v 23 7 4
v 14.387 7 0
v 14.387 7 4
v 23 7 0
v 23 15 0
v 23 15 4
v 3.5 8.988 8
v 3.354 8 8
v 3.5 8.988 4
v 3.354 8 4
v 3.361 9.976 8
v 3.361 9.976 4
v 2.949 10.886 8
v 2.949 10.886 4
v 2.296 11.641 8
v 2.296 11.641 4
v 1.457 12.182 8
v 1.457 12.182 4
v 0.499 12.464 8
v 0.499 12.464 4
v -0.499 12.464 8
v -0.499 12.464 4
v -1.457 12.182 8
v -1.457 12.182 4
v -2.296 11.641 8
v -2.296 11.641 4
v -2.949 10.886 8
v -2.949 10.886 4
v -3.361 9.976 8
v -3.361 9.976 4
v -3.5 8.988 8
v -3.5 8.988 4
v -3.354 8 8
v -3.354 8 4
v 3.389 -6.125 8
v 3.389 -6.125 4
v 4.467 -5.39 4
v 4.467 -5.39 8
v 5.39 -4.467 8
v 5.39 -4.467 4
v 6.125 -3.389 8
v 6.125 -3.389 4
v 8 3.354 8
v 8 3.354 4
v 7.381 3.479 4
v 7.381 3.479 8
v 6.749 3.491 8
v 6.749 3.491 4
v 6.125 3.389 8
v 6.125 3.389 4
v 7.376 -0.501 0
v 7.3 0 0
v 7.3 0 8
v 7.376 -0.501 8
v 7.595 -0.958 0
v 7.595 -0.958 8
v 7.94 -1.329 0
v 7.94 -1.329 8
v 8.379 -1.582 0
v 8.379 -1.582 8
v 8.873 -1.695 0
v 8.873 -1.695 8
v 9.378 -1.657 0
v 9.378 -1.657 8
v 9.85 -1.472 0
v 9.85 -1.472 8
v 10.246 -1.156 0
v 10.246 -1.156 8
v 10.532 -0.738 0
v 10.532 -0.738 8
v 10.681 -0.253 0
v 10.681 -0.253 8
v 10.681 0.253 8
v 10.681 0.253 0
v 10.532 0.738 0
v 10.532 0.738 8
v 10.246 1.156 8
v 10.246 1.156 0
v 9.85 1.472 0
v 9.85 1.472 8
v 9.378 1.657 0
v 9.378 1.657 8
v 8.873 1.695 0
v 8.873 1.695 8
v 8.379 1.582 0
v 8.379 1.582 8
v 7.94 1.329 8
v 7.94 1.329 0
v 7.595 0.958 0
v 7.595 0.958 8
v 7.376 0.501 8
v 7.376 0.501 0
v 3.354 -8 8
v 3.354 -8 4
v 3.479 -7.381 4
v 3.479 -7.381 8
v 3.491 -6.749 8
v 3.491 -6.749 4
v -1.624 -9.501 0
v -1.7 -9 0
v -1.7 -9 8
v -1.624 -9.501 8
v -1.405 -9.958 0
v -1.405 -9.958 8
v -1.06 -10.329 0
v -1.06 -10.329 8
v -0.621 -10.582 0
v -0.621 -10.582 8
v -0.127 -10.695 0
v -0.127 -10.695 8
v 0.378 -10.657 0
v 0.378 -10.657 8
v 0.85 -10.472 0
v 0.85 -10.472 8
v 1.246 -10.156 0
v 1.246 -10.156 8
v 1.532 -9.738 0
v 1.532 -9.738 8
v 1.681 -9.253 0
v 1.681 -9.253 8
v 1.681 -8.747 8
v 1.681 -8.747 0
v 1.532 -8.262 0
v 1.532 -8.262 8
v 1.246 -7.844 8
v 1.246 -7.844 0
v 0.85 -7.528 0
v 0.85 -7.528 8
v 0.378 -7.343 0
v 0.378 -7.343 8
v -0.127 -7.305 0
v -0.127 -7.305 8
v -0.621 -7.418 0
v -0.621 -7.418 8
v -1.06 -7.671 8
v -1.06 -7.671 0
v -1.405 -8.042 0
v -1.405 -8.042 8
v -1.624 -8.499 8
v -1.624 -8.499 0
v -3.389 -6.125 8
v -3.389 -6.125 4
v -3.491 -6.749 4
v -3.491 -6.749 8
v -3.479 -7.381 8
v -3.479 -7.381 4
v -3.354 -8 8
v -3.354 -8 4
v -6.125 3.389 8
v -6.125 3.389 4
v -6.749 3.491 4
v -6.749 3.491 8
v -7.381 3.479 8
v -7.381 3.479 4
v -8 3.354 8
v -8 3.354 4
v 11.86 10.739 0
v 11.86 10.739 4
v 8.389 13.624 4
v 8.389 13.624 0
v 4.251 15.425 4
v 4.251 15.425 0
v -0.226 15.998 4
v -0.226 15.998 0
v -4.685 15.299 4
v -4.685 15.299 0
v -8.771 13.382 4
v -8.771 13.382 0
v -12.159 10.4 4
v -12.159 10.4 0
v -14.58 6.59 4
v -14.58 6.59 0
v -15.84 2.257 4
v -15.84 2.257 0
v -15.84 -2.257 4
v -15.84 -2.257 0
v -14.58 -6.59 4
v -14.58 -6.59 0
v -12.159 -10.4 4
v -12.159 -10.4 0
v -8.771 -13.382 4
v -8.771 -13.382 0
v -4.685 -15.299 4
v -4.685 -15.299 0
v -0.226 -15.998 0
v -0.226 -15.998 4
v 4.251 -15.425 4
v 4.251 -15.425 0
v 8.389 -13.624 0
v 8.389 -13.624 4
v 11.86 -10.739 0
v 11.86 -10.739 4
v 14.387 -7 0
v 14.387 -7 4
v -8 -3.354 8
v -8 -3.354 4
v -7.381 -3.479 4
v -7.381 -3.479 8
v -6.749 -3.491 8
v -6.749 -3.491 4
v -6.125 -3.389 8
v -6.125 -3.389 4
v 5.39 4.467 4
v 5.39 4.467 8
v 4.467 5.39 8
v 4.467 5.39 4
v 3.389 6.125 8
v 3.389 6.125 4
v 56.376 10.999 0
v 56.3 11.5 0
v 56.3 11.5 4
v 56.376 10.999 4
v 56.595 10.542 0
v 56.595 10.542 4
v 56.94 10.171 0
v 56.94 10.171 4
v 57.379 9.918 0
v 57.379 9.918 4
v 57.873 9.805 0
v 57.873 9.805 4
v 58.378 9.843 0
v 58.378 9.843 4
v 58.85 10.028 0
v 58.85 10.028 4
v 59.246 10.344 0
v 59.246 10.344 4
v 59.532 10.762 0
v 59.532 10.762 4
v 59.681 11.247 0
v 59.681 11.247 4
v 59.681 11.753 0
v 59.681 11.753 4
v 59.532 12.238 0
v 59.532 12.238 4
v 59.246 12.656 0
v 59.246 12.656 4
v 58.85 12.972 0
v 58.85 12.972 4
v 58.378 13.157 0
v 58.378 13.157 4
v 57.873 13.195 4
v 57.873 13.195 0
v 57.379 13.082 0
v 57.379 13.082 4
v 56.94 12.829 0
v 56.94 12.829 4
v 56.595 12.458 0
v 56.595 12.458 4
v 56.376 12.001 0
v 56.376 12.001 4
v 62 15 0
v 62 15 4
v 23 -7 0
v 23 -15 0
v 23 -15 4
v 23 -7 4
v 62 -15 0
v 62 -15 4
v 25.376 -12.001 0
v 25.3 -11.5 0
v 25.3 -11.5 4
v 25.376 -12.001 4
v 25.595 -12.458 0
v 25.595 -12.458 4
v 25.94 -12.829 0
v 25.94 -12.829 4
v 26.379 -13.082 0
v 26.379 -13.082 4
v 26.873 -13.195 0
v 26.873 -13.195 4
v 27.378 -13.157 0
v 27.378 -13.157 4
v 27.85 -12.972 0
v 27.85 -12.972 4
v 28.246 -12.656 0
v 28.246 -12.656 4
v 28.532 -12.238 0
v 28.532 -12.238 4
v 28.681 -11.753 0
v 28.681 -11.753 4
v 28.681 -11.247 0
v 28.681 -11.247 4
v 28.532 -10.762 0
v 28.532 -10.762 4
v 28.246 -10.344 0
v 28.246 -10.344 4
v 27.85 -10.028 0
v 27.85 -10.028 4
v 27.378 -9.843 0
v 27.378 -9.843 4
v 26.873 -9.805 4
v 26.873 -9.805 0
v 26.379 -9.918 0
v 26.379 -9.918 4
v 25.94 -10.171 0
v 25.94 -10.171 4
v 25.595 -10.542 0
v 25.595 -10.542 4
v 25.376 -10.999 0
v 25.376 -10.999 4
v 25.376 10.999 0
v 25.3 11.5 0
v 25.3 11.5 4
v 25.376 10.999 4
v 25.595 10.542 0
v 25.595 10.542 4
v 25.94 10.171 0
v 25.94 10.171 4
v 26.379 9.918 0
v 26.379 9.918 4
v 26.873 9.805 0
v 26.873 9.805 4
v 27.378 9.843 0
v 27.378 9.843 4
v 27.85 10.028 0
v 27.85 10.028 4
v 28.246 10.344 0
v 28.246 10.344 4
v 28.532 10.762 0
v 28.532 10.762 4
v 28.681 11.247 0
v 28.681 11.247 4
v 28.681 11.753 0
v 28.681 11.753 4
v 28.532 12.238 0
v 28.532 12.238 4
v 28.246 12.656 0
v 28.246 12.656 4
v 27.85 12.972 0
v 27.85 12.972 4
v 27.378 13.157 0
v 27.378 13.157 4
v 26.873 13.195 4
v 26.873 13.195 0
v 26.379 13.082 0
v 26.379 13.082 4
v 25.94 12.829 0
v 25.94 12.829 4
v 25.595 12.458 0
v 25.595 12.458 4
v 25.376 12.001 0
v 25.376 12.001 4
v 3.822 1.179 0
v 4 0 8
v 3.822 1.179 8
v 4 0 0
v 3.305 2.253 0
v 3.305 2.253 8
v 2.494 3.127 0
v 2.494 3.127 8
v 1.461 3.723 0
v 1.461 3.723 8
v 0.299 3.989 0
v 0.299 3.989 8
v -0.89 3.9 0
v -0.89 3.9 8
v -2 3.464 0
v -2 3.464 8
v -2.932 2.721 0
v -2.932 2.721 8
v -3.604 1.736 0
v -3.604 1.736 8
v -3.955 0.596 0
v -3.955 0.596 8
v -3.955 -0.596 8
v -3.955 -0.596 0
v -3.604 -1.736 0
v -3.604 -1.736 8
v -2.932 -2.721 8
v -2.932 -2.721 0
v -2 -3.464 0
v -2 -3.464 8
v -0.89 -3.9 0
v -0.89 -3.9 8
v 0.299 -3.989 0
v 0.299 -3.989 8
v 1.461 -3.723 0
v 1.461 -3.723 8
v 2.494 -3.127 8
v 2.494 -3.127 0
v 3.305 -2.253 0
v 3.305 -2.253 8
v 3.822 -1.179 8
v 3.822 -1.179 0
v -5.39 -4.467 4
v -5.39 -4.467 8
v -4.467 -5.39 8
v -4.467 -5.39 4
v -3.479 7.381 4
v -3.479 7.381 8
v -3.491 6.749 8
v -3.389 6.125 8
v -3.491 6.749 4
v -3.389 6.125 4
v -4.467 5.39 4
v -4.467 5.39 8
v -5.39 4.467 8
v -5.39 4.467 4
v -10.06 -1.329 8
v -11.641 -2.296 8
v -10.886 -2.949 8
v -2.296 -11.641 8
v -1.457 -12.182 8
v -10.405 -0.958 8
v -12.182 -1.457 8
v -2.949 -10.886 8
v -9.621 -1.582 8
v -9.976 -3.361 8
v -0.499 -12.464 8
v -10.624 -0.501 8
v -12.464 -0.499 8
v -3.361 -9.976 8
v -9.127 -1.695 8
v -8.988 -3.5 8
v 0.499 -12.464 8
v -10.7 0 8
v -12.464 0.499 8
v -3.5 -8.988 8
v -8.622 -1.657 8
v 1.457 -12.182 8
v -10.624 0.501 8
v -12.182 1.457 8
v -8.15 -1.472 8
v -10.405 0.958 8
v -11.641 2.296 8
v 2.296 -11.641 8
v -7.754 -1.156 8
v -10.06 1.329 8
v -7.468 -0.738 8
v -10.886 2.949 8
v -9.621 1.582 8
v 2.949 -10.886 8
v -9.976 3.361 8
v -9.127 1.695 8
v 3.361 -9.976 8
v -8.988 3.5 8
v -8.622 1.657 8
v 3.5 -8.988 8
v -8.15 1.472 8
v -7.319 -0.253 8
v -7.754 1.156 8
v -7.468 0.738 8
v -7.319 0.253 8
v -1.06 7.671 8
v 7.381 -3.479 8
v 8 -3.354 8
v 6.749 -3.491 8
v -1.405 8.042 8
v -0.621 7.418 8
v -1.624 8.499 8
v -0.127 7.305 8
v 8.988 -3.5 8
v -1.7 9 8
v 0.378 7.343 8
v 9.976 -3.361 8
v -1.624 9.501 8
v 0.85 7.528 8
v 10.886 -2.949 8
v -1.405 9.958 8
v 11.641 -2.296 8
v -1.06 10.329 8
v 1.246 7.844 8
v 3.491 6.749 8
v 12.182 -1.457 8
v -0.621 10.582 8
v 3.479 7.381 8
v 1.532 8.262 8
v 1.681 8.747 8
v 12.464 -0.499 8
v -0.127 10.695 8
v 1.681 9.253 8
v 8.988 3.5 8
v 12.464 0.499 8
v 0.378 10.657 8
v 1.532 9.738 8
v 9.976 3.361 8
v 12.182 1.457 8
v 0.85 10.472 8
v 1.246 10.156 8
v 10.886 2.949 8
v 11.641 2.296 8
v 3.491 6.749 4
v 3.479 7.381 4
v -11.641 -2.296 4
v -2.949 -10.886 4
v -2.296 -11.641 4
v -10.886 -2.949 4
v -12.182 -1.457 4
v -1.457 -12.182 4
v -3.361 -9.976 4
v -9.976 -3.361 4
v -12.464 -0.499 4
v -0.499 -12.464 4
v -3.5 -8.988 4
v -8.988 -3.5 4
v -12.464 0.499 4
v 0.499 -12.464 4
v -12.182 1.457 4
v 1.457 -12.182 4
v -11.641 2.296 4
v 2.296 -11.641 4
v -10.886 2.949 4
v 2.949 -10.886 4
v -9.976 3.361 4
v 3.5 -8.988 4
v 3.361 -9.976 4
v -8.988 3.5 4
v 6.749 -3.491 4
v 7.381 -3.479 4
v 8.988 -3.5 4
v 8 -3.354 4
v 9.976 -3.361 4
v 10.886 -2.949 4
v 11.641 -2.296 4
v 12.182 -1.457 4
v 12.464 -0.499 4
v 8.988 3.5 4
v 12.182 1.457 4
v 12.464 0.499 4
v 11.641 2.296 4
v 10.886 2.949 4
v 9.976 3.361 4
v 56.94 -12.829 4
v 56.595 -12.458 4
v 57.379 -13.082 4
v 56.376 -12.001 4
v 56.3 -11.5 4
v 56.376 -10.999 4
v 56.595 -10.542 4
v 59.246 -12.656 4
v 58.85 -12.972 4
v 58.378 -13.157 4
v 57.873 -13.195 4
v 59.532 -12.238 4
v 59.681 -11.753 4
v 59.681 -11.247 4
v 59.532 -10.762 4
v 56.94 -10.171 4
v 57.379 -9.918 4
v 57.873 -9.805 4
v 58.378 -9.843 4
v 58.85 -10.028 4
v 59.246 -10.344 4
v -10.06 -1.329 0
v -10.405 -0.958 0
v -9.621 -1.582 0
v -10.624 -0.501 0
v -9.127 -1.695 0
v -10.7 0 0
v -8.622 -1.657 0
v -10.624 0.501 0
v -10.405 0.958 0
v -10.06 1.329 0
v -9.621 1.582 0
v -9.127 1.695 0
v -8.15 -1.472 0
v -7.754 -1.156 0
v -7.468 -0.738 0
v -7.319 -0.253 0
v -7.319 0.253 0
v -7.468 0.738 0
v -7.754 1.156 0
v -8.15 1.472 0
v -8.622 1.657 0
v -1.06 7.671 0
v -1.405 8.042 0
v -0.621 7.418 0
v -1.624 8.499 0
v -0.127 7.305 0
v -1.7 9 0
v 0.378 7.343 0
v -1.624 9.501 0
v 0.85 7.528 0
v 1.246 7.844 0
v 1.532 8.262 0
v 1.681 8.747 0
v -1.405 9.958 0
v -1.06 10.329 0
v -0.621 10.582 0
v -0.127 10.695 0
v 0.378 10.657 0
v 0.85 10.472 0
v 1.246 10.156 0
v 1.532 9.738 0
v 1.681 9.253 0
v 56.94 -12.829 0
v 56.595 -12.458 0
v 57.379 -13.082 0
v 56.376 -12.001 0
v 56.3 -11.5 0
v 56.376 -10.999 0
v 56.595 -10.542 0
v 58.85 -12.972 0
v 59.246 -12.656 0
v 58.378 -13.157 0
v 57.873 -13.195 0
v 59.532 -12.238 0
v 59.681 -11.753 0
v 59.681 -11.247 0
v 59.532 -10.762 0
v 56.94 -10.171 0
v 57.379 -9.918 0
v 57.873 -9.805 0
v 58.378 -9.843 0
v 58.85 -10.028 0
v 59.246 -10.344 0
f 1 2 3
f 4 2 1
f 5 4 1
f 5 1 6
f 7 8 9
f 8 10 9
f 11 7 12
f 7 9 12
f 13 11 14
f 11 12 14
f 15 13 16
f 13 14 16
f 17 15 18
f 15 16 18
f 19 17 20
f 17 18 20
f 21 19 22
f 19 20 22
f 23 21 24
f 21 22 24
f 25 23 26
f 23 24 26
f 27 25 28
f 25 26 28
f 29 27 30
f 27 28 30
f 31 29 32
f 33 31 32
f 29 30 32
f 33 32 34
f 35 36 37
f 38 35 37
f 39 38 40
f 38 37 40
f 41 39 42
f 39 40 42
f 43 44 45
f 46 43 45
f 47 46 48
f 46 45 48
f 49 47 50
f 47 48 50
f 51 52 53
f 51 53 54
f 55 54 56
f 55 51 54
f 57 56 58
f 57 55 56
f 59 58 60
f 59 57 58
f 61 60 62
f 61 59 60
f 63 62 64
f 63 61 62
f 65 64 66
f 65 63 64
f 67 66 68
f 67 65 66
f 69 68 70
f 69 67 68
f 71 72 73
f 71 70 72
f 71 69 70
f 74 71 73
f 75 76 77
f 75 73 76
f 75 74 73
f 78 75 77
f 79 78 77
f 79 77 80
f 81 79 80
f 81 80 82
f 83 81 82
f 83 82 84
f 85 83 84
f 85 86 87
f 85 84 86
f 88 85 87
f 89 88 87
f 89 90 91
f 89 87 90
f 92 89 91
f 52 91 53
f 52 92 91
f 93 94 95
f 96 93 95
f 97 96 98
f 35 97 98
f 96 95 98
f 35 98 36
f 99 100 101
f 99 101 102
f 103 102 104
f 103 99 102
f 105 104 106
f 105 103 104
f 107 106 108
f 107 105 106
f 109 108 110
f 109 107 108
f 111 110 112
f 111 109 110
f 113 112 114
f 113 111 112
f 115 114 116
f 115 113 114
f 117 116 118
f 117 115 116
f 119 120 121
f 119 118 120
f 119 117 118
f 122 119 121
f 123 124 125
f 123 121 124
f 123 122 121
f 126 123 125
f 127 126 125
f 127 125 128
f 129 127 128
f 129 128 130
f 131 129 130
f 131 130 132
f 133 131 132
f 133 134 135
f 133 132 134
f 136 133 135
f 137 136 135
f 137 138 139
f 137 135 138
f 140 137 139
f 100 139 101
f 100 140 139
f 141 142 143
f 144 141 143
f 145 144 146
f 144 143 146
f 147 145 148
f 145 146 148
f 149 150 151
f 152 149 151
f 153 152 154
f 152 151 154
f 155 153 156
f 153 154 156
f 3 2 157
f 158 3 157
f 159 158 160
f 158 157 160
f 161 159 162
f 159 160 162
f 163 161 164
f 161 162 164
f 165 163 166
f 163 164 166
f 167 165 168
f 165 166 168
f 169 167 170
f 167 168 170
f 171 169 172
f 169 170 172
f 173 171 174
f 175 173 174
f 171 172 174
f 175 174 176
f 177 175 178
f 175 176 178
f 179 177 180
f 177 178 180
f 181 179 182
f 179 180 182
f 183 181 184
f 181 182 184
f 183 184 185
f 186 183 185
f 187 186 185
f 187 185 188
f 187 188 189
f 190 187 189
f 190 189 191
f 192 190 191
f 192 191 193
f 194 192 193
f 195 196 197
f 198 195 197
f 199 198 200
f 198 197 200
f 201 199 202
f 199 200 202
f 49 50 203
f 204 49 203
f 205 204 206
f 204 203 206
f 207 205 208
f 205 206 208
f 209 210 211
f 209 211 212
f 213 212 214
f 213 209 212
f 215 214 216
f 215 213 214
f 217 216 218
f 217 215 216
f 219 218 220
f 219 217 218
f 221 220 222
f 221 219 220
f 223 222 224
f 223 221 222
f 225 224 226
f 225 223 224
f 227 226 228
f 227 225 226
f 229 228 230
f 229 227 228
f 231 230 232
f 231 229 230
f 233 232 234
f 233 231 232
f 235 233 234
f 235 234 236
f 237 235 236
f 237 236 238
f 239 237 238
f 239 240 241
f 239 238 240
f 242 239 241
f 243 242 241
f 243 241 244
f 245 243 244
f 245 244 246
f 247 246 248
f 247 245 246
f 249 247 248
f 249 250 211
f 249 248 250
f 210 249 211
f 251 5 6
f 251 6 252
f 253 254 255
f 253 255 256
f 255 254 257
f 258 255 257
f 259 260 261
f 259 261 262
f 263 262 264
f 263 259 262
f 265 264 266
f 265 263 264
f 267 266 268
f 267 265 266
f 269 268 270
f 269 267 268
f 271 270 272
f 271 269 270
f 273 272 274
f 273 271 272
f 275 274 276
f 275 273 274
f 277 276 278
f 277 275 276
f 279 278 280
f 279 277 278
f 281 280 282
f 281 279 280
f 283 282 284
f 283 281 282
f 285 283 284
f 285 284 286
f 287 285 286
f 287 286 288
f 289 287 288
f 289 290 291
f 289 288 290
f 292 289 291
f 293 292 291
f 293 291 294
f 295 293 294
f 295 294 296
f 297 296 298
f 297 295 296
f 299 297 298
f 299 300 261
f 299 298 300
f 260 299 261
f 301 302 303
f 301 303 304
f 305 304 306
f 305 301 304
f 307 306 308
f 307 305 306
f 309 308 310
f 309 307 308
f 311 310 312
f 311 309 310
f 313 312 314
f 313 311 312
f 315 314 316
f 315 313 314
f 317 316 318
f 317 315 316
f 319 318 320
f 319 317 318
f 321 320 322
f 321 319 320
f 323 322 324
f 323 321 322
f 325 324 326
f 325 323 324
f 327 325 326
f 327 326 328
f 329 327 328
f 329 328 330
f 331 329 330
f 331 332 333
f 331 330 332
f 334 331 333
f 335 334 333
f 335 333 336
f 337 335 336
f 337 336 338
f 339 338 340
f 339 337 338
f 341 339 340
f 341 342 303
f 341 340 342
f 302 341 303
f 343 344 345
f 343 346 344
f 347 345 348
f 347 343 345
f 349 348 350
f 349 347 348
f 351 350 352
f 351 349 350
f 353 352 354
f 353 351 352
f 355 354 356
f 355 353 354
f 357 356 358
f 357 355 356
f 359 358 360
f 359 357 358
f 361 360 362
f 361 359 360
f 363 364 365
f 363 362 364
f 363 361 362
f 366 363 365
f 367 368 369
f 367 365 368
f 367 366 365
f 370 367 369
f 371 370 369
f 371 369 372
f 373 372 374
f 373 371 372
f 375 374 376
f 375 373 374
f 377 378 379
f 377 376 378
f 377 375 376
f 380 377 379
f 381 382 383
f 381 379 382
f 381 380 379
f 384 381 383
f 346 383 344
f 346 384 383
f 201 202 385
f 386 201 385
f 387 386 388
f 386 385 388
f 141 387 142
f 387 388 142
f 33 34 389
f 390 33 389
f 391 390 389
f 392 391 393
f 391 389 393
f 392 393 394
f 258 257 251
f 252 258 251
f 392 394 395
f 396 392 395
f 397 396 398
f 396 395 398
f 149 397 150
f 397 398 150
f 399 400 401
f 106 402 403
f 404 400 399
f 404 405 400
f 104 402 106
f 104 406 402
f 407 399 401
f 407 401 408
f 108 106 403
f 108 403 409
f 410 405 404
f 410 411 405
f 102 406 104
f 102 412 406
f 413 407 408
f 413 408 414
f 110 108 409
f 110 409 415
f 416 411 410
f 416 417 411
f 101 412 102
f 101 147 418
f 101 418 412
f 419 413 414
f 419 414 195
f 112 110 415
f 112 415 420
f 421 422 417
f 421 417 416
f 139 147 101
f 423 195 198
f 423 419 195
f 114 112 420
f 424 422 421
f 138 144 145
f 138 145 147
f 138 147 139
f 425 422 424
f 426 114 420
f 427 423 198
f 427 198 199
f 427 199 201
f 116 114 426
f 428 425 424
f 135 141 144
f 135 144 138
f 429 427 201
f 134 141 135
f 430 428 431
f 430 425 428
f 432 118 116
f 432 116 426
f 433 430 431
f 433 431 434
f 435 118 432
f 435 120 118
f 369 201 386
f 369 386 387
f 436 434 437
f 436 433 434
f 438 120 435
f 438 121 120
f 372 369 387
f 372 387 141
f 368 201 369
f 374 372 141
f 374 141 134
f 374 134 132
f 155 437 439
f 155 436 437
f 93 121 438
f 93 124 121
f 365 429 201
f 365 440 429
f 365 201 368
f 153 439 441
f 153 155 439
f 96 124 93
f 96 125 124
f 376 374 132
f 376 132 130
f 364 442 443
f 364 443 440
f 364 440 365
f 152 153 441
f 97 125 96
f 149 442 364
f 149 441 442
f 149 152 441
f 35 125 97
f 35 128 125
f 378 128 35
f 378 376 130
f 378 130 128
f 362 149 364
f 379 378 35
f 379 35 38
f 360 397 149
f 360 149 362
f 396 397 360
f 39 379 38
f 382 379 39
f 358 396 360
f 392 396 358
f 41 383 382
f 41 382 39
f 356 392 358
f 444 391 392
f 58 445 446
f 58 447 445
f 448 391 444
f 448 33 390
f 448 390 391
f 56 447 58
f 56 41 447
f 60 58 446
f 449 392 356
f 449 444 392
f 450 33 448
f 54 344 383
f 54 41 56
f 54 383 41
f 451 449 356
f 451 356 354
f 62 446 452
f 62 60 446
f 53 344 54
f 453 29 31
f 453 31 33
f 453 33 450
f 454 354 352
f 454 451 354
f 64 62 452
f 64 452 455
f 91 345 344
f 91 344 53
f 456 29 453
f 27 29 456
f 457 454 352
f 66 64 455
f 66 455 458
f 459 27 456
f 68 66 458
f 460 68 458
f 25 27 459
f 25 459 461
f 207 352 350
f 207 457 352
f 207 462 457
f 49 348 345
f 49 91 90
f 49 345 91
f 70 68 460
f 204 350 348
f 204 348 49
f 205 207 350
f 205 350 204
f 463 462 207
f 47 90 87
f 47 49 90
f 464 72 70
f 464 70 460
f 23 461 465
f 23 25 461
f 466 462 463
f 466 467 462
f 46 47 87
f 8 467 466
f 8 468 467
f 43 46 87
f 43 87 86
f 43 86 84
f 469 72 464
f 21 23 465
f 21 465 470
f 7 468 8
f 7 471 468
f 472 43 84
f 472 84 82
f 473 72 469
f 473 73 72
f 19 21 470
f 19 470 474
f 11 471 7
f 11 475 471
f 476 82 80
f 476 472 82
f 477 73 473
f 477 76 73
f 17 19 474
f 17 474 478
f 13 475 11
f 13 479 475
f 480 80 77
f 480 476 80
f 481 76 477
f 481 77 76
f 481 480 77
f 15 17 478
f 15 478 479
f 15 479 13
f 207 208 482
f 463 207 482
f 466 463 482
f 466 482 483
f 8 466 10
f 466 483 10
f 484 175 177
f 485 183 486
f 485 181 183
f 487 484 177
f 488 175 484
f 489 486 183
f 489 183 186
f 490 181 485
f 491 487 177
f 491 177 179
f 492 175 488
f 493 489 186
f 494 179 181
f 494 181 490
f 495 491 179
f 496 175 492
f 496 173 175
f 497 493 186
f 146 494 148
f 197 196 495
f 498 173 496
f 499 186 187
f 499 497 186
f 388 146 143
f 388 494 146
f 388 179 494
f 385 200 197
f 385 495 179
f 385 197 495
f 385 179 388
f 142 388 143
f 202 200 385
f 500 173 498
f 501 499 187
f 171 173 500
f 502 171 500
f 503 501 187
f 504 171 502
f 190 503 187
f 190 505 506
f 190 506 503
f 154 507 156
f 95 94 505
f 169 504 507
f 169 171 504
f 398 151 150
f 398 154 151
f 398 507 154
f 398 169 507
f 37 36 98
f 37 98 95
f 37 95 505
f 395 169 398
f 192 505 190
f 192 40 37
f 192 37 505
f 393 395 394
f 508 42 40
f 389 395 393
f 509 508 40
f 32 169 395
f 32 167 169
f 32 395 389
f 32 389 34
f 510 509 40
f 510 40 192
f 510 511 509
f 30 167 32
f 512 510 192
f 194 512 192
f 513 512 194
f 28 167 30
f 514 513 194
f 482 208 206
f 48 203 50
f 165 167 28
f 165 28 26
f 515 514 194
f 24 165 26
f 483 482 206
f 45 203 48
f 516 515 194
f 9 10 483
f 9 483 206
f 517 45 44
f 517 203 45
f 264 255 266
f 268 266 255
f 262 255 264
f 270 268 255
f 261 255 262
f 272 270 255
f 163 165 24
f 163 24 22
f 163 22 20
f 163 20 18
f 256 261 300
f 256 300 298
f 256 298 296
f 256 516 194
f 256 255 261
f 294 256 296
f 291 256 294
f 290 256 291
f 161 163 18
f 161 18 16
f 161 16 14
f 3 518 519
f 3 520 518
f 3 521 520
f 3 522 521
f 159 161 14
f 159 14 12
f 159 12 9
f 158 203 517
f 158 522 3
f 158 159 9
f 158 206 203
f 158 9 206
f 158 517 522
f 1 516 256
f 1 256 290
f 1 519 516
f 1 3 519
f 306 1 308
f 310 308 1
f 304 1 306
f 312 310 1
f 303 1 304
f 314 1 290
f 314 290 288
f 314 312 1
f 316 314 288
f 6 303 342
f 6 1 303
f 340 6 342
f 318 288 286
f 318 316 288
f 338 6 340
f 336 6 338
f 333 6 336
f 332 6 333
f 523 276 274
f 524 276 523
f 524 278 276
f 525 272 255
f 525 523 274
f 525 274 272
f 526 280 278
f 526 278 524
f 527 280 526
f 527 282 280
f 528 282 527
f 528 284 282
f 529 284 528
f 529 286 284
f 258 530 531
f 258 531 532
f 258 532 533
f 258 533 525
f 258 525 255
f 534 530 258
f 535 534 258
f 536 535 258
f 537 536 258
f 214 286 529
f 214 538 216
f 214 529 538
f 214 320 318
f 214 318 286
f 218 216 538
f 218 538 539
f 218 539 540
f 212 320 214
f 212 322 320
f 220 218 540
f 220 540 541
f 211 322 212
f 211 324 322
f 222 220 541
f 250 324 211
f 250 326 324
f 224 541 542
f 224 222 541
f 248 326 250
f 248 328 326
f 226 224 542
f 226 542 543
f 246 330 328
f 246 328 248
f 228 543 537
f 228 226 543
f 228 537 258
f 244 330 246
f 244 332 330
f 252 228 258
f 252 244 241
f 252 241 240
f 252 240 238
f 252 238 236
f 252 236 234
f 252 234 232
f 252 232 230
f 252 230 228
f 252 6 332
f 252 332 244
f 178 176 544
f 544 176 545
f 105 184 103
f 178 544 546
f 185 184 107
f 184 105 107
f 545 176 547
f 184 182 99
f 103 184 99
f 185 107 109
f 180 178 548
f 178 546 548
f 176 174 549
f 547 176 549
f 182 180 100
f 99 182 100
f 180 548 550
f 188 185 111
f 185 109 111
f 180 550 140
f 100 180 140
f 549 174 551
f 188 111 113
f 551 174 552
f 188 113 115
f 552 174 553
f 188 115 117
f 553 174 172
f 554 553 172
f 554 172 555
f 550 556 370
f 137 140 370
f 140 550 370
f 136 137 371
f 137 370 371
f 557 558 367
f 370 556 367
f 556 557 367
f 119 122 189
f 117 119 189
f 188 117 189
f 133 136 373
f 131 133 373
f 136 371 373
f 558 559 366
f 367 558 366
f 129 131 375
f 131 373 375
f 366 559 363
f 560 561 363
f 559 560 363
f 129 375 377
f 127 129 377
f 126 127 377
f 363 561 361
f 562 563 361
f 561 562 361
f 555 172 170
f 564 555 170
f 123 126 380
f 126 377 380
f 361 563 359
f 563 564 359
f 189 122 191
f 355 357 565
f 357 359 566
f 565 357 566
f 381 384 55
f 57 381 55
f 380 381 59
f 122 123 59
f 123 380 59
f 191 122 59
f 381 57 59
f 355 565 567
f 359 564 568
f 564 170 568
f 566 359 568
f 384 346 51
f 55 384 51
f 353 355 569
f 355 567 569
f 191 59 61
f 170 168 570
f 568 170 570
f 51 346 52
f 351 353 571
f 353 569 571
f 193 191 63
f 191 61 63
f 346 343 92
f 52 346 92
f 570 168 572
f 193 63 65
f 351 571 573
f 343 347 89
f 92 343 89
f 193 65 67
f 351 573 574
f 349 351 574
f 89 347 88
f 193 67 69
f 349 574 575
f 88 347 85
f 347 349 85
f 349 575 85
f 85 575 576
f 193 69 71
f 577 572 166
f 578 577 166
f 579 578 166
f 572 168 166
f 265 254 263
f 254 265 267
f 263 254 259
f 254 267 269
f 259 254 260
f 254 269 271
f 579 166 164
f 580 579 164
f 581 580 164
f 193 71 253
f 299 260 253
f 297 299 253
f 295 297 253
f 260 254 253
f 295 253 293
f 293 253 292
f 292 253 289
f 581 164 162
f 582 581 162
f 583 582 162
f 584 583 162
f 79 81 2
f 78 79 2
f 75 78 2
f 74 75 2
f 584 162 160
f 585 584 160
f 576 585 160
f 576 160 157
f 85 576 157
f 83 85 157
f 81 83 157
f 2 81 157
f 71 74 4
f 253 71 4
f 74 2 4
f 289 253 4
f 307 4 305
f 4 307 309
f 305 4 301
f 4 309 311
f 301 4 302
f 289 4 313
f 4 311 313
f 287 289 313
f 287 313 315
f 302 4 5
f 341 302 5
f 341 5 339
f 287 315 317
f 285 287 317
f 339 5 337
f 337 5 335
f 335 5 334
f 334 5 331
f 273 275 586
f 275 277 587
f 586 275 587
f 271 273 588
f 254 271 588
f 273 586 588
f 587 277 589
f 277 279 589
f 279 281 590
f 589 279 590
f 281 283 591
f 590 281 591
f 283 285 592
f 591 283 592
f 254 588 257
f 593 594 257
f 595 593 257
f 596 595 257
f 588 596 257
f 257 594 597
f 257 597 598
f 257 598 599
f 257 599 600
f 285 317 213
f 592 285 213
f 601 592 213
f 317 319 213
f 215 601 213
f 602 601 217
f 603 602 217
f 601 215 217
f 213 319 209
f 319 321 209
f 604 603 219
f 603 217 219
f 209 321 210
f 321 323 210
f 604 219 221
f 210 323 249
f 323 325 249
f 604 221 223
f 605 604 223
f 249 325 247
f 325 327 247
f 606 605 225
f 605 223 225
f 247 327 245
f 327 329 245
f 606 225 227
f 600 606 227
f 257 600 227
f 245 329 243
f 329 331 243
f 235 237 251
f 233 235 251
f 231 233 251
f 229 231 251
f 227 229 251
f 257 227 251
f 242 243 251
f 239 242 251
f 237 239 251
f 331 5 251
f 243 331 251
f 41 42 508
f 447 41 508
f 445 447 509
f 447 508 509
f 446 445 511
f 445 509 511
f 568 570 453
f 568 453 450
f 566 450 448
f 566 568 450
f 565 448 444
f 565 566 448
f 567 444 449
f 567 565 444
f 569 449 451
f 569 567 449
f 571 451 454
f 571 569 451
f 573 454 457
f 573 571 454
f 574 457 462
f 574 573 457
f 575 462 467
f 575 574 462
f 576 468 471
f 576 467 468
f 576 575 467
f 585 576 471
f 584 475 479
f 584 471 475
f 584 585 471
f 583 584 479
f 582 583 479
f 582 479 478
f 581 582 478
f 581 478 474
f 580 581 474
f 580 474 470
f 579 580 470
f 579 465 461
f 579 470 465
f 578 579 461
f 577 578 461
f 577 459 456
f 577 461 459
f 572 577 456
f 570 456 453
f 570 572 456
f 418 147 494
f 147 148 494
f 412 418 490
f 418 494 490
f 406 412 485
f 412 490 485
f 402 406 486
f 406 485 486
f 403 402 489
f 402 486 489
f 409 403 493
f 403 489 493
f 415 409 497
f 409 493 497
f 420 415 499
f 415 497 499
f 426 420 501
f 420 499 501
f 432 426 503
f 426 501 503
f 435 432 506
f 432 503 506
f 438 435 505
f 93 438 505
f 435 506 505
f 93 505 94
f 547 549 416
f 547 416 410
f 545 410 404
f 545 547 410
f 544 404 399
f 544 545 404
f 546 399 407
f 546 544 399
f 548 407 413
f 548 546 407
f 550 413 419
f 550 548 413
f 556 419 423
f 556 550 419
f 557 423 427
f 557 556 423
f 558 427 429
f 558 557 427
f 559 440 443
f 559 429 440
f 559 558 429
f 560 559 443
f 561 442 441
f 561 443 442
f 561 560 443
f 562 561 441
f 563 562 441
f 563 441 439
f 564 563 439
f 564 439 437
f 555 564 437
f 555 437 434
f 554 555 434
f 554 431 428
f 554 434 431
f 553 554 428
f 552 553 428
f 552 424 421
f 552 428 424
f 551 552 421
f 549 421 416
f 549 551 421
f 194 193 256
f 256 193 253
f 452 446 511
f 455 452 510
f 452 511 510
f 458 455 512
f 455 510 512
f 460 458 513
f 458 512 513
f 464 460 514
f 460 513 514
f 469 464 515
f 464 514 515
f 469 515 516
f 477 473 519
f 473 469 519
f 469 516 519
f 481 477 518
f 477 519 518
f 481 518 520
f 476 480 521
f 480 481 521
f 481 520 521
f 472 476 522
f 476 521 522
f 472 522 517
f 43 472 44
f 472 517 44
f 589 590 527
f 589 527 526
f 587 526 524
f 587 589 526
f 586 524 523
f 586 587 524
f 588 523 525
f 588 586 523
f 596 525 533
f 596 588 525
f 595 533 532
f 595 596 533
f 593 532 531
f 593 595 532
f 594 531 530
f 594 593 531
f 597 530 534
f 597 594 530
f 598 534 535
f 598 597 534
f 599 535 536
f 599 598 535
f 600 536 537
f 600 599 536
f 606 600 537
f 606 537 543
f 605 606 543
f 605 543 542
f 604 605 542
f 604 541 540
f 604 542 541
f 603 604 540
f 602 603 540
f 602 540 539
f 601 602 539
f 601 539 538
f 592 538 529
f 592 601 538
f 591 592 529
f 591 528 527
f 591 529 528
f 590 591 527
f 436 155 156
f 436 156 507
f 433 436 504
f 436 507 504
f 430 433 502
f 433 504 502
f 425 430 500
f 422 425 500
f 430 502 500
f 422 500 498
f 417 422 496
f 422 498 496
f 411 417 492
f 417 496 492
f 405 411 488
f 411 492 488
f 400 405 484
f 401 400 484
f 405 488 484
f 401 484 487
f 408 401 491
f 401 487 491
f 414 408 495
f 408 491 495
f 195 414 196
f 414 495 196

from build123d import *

# Parameters (mm, degrees)
METAL_HORN_FLANGE_PROFILE_R              = 16
METAL_HORN_FLANGE_DEPTH                  = 4
STRAIGHT_FOREARM_WEB_PROFILE_W           = 28
STRAIGHT_FOREARM_WEB_PROFILE_H           = 14
STRAIGHT_FOREARM_WEB_DEPTH               = 4
REPLACEABLE_TOOL_MOUNTING_DECK_PROFILE_W = 39
REPLACEABLE_TOOL_MOUNTING_DECK_PROFILE_H = 30
REPLACEABLE_TOOL_MOUNTING_DECK_DEPTH     = 4
DOWEL_SUPPORT_HUB_START                  = 4
DOWEL_SUPPORT_HUB_PROFILE_R              = 7
DOWEL_SUPPORT_HUB_PROFILE_R_2            = 4
DOWEL_SUPPORT_HUB_DEPTH                  = 4
WASHER_SEATS_CLEAR_DOWEL_SLEEVE_START    = 4
RAISED_WASHER_SEATS_PCD14_R              = 3.5
WASHER_SEATS_CLEAR_DOWEL_SLEEVE_DEPTH    = 4
ELBOW_SLEEVE_BORE_START                  = -50
ELBOW_SLEEVE_BORE_PROFILE_R              = 4
ELBOW_SLEEVE_BORE_DEPTH                  = 115.52906322
MODULAR_TOOL_FOUR_M3_PATTERN_START       = -50
MODULAR_TOOL_FOUR_M3_PATTERN_PROFILE_R   = 1.7
MODULAR_TOOL_FOUR_M3_PATTERN_DEPTH       = 115.52906322
PRINTED_HUB_M3_WASHER_SEATS_PCD18_START  = 4
PRINTED_HUB_WASHER_SEATS_PCD18_PROFILE_R = 3.5
PRINTED_HUB_M3_WASHER_SEATS_PCD18_DEPTH  = 4
PRINTED_HUB_M3_CLEARANCE_PCD18_START     = -50
PRINTED_HUB_M3_CLEARANCE_PCD18_PROFILE_R = 1.7
PRINTED_HUB_M3_CLEARANCE_PCD18_DEPTH     = 115.52906322


with BuildPart() as part:
    # Metal_horn_flange_profile → Metal_horn_flange (new body)
    with BuildSketch(Plane.XY):
        Circle(METAL_HORN_FLANGE_PROFILE_R)
    extrude(amount=METAL_HORN_FLANGE_DEPTH)

    # Straight_forearm_web_profile → Straight_forearm_web (add)
    with BuildSketch(Plane.XY):
        with Locations((14, 0)):
            Rectangle(STRAIGHT_FOREARM_WEB_PROFILE_W, STRAIGHT_FOREARM_WEB_PROFILE_H)
    extrude(amount=STRAIGHT_FOREARM_WEB_DEPTH)

    # Replaceable_tool_mounting_deck_profile → Replaceable_tool_mounting_deck (add)
    with BuildSketch(Plane.XY):
        with Locations((42.5, 0)):
            Rectangle(REPLACEABLE_TOOL_MOUNTING_DECK_PROFILE_W, REPLACEABLE_TOOL_MOUNTING_DECK_PROFILE_H)
    extrude(amount=REPLACEABLE_TOOL_MOUNTING_DECK_DEPTH)

    # Dowel_support_hub_profile → Dowel_support_hub (add)
    with BuildSketch(Plane.XY.offset(DOWEL_SUPPORT_HUB_START)):
        Circle(DOWEL_SUPPORT_HUB_PROFILE_R)
        Circle(DOWEL_SUPPORT_HUB_PROFILE_R_2, mode=Mode.SUBTRACT)
    extrude(amount=DOWEL_SUPPORT_HUB_DEPTH)

    # Raised_washer_seats_PCD14 → Washer_seats_clear_dowel_sleeve (add)
    with BuildSketch(Plane.XY.offset(WASHER_SEATS_CLEAR_DOWEL_SLEEVE_START)):
        with Locations((7, 0)):
            Circle(RAISED_WASHER_SEATS_PCD14_R)
        with Locations((-7, 0)):
            Circle(RAISED_WASHER_SEATS_PCD14_R)
        with Locations((0, 7)):
            Circle(RAISED_WASHER_SEATS_PCD14_R)
        with Locations((0, -7)):
            Circle(RAISED_WASHER_SEATS_PCD14_R)
    extrude(amount=WASHER_SEATS_CLEAR_DOWEL_SLEEVE_DEPTH)

    # Elbow_sleeve_bore_profile → Elbow_sleeve_bore (cut, through all)
    with BuildSketch(Plane.XY.offset(ELBOW_SLEEVE_BORE_START)):
        Circle(ELBOW_SLEEVE_BORE_PROFILE_R)
    extrude(amount=ELBOW_SLEEVE_BORE_DEPTH, mode=Mode.SUBTRACT)

    # Modular_tool_four_M3_pattern_profile → Modular_tool_four_M3_pattern (cut, through all)
    with BuildSketch(Plane.XY.offset(MODULAR_TOOL_FOUR_M3_PATTERN_START)):
        with Locations((27, -11.5)):
            Circle(MODULAR_TOOL_FOUR_M3_PATTERN_PROFILE_R)
        with Locations((27, 11.5)):
            Circle(MODULAR_TOOL_FOUR_M3_PATTERN_PROFILE_R)
        with Locations((58, -11.5)):
            Circle(MODULAR_TOOL_FOUR_M3_PATTERN_PROFILE_R)
        with Locations((58, 11.5)):
            Circle(MODULAR_TOOL_FOUR_M3_PATTERN_PROFILE_R)
    extrude(amount=MODULAR_TOOL_FOUR_M3_PATTERN_DEPTH, mode=Mode.SUBTRACT)

    # Printed_hub_washer_seats_PCD18_profile → Printed_hub_M3_washer_seats_PCD18 (add)
    with BuildSketch(Plane.XY.offset(PRINTED_HUB_M3_WASHER_SEATS_PCD18_START)):
        with Locations((9, 0)):
            Circle(PRINTED_HUB_WASHER_SEATS_PCD18_PROFILE_R)
        with Locations((0, 9)):
            Circle(PRINTED_HUB_WASHER_SEATS_PCD18_PROFILE_R)
        with Locations((-9, 0)):
            Circle(PRINTED_HUB_WASHER_SEATS_PCD18_PROFILE_R)
        with Locations((0, -9)):
            Circle(PRINTED_HUB_WASHER_SEATS_PCD18_PROFILE_R)
    extrude(amount=PRINTED_HUB_M3_WASHER_SEATS_PCD18_DEPTH)

    # Printed_hub_M3_clearance_PCD18_profile → Printed_hub_M3_clearance_PCD18 (cut, through all)
    with BuildSketch(Plane.XY.offset(PRINTED_HUB_M3_CLEARANCE_PCD18_START)):
        with Locations((9, 0)):
            Circle(PRINTED_HUB_M3_CLEARANCE_PCD18_PROFILE_R)
        with Locations((0, 9)):
            Circle(PRINTED_HUB_M3_CLEARANCE_PCD18_PROFILE_R)
        with Locations((-9, 0)):
            Circle(PRINTED_HUB_M3_CLEARANCE_PCD18_PROFILE_R)
        with Locations((0, -9)):
            Circle(PRINTED_HUB_M3_CLEARANCE_PCD18_PROFILE_R)
    extrude(amount=PRINTED_HUB_M3_CLEARANCE_PCD18_DEPTH, mode=Mode.SUBTRACT)


solid = part.part
